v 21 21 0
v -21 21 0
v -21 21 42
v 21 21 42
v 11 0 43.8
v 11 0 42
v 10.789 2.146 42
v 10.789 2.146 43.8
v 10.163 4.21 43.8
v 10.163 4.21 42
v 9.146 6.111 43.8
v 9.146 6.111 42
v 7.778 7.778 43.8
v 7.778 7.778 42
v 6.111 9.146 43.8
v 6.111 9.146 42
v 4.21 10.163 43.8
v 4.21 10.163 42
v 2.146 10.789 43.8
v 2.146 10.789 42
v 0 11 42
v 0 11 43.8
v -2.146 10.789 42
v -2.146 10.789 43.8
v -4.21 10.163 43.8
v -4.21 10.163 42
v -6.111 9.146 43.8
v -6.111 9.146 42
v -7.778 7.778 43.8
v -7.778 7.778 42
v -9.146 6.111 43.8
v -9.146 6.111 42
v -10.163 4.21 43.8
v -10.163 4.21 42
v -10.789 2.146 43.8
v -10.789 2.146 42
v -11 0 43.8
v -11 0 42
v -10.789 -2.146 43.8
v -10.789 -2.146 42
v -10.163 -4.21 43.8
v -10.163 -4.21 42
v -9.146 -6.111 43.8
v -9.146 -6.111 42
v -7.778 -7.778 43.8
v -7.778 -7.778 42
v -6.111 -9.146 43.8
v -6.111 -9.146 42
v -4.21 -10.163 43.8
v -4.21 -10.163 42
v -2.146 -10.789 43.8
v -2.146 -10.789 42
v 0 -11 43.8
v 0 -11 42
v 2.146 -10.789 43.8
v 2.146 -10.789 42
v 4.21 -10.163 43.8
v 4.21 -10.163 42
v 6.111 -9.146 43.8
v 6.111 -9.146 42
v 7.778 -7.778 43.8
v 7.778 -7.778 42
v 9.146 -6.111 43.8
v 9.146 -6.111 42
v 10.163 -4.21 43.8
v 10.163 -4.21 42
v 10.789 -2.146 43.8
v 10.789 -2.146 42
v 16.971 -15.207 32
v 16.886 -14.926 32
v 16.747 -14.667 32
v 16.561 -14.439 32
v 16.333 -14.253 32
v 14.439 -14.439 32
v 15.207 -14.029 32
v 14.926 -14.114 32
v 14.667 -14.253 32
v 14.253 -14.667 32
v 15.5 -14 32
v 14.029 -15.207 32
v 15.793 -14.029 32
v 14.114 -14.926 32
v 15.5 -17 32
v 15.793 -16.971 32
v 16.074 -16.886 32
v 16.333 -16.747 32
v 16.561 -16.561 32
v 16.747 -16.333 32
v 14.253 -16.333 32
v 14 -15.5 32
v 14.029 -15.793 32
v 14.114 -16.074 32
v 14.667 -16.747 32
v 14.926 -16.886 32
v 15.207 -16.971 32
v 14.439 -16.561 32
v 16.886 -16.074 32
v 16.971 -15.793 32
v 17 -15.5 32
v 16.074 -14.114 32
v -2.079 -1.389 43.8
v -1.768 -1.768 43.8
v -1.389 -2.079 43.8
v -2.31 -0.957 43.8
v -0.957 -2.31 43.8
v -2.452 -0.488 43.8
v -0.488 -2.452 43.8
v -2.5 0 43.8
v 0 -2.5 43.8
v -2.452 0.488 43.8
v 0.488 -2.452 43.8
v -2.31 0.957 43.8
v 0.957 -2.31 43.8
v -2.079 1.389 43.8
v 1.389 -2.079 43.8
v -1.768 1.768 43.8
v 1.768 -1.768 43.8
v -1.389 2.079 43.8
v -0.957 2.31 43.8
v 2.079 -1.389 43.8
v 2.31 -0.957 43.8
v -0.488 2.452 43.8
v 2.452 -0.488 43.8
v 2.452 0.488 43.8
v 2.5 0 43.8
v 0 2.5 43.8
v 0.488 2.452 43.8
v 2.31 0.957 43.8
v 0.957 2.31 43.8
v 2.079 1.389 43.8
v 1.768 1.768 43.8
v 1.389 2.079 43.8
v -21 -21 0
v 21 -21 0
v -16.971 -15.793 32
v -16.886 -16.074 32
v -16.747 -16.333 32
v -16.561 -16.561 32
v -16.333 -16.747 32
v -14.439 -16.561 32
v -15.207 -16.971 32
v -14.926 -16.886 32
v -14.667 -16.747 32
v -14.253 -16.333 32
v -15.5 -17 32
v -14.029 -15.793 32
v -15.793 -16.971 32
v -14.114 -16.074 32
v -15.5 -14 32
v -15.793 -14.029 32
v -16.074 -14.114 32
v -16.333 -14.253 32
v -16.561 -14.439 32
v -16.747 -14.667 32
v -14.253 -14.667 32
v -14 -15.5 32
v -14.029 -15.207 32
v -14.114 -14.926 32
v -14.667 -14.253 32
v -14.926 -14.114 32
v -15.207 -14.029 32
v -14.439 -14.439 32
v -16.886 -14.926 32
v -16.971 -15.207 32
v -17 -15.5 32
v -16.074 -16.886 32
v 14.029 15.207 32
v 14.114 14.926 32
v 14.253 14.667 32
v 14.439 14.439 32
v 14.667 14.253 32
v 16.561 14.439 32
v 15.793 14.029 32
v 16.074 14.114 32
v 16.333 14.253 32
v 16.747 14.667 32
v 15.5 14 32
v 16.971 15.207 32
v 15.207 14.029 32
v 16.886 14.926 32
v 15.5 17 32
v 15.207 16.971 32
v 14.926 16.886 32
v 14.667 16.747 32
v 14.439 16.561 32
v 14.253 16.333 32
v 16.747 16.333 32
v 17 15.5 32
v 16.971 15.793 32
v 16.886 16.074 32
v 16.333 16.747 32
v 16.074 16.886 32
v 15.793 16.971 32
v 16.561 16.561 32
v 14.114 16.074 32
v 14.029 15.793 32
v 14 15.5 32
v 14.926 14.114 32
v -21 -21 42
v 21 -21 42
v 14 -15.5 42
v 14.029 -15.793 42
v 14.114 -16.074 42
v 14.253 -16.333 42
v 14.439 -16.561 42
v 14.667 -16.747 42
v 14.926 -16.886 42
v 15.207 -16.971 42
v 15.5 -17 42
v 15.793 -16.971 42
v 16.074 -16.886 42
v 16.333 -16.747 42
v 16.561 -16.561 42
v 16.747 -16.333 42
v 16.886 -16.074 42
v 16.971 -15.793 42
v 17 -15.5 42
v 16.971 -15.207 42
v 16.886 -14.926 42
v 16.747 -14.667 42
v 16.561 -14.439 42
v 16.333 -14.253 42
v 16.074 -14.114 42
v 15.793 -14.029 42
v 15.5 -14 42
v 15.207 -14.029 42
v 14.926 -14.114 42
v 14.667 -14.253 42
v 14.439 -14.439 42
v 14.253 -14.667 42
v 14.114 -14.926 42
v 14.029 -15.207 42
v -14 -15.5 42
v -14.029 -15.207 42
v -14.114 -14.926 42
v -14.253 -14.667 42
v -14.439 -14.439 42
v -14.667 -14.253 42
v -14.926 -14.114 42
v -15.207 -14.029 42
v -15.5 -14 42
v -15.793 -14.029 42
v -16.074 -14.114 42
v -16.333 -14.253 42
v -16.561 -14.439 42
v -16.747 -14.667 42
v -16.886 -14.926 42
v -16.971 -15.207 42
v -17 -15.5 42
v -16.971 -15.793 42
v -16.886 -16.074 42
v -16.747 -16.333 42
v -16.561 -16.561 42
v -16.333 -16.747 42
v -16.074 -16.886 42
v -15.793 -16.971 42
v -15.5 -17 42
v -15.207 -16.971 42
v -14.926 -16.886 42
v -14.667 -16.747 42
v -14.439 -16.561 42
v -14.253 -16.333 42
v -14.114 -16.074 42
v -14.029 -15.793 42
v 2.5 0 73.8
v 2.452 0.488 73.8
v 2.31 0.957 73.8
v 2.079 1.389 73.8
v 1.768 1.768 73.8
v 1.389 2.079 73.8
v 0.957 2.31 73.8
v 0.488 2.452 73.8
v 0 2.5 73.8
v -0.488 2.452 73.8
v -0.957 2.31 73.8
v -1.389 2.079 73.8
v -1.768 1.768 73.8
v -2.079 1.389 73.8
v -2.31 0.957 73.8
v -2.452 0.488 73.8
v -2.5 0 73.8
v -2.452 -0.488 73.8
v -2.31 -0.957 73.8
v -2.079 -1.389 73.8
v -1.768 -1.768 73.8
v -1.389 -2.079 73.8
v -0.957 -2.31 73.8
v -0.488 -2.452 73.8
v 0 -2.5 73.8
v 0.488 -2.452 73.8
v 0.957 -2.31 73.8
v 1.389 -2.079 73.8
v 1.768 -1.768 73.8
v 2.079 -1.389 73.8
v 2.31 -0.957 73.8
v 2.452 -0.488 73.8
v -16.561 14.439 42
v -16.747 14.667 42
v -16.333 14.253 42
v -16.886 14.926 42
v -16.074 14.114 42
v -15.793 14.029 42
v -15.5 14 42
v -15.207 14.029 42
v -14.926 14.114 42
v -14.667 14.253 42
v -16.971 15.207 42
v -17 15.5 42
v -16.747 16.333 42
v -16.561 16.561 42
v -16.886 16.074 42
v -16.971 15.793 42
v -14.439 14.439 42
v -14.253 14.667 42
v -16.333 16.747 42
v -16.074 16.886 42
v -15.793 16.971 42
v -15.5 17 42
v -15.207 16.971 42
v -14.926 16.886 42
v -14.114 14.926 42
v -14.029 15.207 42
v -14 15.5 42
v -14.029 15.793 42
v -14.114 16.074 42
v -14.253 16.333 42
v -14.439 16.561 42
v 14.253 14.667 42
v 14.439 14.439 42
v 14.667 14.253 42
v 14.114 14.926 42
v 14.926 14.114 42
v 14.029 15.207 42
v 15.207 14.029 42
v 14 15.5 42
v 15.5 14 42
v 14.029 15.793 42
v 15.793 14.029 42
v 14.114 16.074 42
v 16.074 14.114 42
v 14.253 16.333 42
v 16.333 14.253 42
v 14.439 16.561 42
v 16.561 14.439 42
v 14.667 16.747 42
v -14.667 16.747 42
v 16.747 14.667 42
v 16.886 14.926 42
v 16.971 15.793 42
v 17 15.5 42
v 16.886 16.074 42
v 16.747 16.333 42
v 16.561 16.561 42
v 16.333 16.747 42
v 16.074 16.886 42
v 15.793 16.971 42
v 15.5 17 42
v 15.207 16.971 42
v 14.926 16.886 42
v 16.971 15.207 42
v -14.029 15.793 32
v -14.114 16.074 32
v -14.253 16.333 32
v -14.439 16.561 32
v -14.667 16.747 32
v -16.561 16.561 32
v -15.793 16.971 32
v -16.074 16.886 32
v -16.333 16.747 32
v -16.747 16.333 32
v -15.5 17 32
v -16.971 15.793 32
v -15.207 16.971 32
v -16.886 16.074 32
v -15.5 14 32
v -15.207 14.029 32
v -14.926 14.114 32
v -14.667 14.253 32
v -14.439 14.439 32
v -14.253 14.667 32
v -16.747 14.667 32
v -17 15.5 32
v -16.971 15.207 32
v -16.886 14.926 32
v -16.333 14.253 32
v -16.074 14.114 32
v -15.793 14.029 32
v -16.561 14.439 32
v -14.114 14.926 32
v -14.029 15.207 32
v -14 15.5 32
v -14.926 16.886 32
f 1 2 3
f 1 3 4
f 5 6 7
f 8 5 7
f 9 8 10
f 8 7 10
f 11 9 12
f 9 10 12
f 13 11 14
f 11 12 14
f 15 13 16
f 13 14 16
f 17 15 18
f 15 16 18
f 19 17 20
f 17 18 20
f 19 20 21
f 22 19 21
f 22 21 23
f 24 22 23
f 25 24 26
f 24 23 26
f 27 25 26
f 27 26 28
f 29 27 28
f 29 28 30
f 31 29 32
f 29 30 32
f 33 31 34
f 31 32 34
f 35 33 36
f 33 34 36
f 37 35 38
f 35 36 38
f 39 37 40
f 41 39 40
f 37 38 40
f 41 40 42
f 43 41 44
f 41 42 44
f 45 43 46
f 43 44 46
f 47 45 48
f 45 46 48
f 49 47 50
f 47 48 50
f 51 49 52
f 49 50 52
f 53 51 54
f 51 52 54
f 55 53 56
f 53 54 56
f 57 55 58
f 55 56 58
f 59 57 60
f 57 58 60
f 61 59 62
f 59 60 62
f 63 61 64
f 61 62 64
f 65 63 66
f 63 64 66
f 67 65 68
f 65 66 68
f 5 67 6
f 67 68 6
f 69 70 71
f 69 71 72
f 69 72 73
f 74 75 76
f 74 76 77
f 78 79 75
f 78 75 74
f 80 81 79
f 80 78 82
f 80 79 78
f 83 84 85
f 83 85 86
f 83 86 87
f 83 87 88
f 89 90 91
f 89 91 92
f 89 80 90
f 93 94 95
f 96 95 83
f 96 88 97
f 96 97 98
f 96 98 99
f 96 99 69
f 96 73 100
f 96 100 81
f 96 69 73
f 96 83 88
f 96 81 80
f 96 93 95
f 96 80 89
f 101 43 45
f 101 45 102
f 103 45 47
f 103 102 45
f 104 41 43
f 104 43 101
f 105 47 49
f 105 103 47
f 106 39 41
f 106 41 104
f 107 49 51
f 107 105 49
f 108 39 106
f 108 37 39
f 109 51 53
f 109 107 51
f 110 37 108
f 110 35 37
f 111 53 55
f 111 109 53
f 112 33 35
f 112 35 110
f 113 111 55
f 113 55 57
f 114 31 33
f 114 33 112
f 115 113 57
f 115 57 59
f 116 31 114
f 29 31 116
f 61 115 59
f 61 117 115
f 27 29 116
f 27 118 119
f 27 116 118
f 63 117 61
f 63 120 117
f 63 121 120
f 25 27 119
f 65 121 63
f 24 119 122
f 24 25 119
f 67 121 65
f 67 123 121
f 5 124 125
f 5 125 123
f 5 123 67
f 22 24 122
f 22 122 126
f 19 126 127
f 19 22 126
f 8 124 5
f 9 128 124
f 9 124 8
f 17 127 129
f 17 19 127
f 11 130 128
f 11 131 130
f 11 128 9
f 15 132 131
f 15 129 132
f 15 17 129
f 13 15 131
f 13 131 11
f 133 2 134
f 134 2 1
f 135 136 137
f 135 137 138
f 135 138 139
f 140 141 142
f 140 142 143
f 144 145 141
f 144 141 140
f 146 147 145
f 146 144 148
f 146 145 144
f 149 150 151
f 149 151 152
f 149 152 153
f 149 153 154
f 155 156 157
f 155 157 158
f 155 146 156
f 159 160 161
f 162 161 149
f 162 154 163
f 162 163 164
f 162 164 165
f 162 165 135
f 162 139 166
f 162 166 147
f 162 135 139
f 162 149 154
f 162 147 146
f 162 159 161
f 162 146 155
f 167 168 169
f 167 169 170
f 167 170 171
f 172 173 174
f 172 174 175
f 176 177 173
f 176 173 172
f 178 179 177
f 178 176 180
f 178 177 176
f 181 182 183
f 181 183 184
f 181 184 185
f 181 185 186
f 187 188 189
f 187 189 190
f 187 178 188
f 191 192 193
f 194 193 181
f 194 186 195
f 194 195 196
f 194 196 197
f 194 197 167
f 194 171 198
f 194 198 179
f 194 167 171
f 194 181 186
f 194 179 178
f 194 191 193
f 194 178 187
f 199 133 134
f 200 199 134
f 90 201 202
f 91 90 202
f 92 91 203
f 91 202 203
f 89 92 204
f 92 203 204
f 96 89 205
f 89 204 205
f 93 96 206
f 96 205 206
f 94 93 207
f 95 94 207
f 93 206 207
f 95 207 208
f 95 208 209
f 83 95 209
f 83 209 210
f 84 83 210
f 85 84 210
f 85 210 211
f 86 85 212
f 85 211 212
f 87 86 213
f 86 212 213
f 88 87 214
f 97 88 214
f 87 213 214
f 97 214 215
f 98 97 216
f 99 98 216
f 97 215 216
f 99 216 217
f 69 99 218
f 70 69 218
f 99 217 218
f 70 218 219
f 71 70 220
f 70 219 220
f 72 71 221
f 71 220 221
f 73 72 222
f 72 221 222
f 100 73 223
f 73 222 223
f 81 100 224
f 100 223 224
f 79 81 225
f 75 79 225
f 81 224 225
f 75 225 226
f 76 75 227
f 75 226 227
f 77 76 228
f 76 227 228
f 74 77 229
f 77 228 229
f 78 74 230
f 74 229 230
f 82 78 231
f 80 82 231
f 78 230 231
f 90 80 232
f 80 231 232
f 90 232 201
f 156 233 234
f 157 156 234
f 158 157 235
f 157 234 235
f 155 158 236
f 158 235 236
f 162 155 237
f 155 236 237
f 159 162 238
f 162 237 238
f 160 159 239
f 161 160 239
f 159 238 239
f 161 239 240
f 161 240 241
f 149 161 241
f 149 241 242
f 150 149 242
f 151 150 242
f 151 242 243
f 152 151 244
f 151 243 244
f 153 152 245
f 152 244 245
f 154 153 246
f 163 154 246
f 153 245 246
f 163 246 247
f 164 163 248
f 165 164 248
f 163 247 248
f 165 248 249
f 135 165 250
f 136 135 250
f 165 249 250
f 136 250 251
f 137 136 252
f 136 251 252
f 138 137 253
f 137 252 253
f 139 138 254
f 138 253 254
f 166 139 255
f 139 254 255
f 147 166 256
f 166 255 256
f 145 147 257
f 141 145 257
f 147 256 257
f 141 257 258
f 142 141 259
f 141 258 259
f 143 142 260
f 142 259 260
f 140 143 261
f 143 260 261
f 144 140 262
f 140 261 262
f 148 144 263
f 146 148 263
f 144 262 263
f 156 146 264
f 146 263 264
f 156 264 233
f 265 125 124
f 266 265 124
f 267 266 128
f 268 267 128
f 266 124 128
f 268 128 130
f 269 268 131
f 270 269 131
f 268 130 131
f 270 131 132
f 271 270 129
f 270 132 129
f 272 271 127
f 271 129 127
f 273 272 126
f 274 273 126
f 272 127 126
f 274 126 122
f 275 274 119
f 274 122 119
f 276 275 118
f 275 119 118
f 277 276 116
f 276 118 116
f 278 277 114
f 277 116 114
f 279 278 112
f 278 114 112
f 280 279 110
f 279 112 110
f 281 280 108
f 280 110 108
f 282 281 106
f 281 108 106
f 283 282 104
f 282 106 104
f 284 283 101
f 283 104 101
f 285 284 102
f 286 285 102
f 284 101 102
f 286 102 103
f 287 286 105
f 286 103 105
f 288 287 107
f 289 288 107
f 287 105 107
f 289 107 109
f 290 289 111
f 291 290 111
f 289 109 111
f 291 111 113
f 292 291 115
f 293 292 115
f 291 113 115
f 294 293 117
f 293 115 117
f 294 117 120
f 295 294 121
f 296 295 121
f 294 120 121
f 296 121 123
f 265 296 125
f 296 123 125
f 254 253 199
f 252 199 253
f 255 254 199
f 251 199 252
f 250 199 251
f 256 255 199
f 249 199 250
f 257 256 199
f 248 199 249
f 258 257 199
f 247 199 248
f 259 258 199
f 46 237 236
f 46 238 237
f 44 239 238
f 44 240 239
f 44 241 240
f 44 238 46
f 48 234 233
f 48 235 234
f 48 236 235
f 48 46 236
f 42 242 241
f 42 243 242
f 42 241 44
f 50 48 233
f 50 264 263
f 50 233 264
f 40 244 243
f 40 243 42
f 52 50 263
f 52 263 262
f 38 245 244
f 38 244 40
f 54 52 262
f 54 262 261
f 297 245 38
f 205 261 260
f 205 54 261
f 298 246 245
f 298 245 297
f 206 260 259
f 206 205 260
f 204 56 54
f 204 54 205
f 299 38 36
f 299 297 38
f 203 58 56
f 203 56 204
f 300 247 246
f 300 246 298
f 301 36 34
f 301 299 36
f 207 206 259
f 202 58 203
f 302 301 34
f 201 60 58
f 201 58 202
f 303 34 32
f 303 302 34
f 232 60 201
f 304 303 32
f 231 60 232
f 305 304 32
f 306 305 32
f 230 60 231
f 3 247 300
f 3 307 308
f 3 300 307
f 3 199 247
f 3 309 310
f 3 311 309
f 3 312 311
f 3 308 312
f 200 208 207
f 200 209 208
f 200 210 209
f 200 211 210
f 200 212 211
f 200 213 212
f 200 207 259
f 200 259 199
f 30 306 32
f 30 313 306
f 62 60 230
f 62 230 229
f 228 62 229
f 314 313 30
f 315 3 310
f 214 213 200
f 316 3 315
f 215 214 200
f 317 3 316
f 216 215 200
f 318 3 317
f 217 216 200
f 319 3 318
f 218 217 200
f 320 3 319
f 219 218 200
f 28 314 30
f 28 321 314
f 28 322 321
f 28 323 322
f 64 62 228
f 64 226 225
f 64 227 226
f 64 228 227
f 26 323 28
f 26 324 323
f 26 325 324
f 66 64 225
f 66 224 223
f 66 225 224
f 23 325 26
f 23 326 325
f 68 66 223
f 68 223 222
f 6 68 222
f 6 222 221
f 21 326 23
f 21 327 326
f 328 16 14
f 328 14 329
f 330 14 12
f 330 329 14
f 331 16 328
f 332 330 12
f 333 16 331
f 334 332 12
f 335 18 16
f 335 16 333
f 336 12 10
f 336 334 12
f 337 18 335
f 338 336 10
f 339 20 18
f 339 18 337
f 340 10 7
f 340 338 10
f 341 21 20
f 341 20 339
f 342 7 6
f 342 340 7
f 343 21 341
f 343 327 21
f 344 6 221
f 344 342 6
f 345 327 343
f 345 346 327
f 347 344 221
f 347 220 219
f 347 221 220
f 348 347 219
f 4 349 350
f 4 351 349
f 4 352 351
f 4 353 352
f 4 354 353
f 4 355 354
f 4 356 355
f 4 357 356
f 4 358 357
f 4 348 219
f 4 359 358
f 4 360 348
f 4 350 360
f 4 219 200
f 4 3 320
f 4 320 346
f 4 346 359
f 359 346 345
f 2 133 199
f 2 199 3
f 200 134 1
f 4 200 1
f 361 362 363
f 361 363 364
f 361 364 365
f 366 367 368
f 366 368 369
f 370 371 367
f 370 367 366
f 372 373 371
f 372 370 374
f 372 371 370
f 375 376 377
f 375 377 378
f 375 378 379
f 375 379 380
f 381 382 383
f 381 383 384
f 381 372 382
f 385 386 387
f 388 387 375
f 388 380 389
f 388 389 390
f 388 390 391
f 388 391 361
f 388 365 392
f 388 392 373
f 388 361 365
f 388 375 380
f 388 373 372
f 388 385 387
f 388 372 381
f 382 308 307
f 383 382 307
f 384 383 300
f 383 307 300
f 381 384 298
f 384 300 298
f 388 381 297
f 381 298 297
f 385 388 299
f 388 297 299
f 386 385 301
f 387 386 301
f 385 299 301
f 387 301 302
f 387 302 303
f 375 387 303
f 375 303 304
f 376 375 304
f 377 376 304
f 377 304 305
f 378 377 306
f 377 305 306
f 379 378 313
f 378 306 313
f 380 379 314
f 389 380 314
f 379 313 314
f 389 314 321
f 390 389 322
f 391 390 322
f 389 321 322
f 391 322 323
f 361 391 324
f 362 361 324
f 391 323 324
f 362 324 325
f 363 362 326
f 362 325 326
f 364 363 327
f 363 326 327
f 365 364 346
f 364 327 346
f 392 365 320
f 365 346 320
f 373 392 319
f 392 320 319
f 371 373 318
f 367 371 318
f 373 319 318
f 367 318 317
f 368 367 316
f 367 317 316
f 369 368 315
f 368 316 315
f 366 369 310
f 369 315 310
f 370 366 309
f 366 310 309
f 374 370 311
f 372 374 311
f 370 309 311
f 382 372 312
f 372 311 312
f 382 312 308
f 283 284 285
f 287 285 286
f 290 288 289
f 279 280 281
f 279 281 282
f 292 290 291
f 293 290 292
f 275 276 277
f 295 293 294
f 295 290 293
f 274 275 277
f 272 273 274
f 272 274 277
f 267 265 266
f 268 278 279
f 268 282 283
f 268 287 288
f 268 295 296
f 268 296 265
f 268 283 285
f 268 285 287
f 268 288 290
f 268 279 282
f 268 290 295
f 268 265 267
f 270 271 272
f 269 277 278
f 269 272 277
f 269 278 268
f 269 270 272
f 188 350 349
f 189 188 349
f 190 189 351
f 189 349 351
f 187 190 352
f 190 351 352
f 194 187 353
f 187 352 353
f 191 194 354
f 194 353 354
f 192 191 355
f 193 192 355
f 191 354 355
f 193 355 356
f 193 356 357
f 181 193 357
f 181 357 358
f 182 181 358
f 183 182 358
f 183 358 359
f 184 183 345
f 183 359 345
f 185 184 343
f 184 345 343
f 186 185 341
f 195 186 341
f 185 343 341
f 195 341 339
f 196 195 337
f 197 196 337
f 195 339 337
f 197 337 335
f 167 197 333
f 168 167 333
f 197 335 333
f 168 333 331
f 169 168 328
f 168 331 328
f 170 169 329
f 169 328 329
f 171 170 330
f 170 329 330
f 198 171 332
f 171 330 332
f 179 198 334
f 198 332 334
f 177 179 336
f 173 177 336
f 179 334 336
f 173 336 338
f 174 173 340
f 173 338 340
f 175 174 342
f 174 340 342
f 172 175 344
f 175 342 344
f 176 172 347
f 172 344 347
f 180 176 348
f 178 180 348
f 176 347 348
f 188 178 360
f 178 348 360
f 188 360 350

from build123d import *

# Parameters (mm, degrees)
SKETCH_1_W          = 42
SKETCH_1_H          = 42
EXTRUDE_1_DEPTH     = 42
SKETCH_2_R          = 1.5
CUT_EXTRUDE_1_DEPTH = 10
SKETCH_3_R          = 11
EXTRUDE_2_DEPTH     = 1.8
SKETCH_4_R          = 2.5
EXTRUDE_3_DEPTH     = 30


with BuildPart() as part:
    # 草图1 → 凸台-拉伸1 (new body)
    with BuildSketch(Plane.XY):
        Rectangle(SKETCH_1_W, SKETCH_1_H)
    extrude(amount=EXTRUDE_1_DEPTH)

    # 草图2 → 切除-拉伸1 (cut)
    with BuildSketch(Plane.XY.offset(42)):
        with Locations((15.5, 15.5)):
            Circle(SKETCH_2_R)
        with Locations(Location((-15.5, 15.5, 0), (0, 0, 180))):
            Circle(SKETCH_2_R)
        with Locations((-15.5, -15.5)):
            Circle(SKETCH_2_R)
        with Locations(Location((15.5, -15.5, 0), (0, 0, 180))):
            Circle(SKETCH_2_R)
    extrude(amount=-CUT_EXTRUDE_1_DEPTH, mode=Mode.SUBTRACT)

    # 草图3 → 凸台-拉伸2 (add)
    with BuildSketch(Plane.XY.offset(42)):
        Circle(SKETCH_3_R)
    extrude(amount=EXTRUDE_2_DEPTH)

    # 草图4 → 凸台-拉伸3 (add)
    with BuildSketch(Plane.XY.offset(43.8)):
        Circle(SKETCH_4_R)
    extrude(amount=EXTRUDE_3_DEPTH)


solid = part.part
